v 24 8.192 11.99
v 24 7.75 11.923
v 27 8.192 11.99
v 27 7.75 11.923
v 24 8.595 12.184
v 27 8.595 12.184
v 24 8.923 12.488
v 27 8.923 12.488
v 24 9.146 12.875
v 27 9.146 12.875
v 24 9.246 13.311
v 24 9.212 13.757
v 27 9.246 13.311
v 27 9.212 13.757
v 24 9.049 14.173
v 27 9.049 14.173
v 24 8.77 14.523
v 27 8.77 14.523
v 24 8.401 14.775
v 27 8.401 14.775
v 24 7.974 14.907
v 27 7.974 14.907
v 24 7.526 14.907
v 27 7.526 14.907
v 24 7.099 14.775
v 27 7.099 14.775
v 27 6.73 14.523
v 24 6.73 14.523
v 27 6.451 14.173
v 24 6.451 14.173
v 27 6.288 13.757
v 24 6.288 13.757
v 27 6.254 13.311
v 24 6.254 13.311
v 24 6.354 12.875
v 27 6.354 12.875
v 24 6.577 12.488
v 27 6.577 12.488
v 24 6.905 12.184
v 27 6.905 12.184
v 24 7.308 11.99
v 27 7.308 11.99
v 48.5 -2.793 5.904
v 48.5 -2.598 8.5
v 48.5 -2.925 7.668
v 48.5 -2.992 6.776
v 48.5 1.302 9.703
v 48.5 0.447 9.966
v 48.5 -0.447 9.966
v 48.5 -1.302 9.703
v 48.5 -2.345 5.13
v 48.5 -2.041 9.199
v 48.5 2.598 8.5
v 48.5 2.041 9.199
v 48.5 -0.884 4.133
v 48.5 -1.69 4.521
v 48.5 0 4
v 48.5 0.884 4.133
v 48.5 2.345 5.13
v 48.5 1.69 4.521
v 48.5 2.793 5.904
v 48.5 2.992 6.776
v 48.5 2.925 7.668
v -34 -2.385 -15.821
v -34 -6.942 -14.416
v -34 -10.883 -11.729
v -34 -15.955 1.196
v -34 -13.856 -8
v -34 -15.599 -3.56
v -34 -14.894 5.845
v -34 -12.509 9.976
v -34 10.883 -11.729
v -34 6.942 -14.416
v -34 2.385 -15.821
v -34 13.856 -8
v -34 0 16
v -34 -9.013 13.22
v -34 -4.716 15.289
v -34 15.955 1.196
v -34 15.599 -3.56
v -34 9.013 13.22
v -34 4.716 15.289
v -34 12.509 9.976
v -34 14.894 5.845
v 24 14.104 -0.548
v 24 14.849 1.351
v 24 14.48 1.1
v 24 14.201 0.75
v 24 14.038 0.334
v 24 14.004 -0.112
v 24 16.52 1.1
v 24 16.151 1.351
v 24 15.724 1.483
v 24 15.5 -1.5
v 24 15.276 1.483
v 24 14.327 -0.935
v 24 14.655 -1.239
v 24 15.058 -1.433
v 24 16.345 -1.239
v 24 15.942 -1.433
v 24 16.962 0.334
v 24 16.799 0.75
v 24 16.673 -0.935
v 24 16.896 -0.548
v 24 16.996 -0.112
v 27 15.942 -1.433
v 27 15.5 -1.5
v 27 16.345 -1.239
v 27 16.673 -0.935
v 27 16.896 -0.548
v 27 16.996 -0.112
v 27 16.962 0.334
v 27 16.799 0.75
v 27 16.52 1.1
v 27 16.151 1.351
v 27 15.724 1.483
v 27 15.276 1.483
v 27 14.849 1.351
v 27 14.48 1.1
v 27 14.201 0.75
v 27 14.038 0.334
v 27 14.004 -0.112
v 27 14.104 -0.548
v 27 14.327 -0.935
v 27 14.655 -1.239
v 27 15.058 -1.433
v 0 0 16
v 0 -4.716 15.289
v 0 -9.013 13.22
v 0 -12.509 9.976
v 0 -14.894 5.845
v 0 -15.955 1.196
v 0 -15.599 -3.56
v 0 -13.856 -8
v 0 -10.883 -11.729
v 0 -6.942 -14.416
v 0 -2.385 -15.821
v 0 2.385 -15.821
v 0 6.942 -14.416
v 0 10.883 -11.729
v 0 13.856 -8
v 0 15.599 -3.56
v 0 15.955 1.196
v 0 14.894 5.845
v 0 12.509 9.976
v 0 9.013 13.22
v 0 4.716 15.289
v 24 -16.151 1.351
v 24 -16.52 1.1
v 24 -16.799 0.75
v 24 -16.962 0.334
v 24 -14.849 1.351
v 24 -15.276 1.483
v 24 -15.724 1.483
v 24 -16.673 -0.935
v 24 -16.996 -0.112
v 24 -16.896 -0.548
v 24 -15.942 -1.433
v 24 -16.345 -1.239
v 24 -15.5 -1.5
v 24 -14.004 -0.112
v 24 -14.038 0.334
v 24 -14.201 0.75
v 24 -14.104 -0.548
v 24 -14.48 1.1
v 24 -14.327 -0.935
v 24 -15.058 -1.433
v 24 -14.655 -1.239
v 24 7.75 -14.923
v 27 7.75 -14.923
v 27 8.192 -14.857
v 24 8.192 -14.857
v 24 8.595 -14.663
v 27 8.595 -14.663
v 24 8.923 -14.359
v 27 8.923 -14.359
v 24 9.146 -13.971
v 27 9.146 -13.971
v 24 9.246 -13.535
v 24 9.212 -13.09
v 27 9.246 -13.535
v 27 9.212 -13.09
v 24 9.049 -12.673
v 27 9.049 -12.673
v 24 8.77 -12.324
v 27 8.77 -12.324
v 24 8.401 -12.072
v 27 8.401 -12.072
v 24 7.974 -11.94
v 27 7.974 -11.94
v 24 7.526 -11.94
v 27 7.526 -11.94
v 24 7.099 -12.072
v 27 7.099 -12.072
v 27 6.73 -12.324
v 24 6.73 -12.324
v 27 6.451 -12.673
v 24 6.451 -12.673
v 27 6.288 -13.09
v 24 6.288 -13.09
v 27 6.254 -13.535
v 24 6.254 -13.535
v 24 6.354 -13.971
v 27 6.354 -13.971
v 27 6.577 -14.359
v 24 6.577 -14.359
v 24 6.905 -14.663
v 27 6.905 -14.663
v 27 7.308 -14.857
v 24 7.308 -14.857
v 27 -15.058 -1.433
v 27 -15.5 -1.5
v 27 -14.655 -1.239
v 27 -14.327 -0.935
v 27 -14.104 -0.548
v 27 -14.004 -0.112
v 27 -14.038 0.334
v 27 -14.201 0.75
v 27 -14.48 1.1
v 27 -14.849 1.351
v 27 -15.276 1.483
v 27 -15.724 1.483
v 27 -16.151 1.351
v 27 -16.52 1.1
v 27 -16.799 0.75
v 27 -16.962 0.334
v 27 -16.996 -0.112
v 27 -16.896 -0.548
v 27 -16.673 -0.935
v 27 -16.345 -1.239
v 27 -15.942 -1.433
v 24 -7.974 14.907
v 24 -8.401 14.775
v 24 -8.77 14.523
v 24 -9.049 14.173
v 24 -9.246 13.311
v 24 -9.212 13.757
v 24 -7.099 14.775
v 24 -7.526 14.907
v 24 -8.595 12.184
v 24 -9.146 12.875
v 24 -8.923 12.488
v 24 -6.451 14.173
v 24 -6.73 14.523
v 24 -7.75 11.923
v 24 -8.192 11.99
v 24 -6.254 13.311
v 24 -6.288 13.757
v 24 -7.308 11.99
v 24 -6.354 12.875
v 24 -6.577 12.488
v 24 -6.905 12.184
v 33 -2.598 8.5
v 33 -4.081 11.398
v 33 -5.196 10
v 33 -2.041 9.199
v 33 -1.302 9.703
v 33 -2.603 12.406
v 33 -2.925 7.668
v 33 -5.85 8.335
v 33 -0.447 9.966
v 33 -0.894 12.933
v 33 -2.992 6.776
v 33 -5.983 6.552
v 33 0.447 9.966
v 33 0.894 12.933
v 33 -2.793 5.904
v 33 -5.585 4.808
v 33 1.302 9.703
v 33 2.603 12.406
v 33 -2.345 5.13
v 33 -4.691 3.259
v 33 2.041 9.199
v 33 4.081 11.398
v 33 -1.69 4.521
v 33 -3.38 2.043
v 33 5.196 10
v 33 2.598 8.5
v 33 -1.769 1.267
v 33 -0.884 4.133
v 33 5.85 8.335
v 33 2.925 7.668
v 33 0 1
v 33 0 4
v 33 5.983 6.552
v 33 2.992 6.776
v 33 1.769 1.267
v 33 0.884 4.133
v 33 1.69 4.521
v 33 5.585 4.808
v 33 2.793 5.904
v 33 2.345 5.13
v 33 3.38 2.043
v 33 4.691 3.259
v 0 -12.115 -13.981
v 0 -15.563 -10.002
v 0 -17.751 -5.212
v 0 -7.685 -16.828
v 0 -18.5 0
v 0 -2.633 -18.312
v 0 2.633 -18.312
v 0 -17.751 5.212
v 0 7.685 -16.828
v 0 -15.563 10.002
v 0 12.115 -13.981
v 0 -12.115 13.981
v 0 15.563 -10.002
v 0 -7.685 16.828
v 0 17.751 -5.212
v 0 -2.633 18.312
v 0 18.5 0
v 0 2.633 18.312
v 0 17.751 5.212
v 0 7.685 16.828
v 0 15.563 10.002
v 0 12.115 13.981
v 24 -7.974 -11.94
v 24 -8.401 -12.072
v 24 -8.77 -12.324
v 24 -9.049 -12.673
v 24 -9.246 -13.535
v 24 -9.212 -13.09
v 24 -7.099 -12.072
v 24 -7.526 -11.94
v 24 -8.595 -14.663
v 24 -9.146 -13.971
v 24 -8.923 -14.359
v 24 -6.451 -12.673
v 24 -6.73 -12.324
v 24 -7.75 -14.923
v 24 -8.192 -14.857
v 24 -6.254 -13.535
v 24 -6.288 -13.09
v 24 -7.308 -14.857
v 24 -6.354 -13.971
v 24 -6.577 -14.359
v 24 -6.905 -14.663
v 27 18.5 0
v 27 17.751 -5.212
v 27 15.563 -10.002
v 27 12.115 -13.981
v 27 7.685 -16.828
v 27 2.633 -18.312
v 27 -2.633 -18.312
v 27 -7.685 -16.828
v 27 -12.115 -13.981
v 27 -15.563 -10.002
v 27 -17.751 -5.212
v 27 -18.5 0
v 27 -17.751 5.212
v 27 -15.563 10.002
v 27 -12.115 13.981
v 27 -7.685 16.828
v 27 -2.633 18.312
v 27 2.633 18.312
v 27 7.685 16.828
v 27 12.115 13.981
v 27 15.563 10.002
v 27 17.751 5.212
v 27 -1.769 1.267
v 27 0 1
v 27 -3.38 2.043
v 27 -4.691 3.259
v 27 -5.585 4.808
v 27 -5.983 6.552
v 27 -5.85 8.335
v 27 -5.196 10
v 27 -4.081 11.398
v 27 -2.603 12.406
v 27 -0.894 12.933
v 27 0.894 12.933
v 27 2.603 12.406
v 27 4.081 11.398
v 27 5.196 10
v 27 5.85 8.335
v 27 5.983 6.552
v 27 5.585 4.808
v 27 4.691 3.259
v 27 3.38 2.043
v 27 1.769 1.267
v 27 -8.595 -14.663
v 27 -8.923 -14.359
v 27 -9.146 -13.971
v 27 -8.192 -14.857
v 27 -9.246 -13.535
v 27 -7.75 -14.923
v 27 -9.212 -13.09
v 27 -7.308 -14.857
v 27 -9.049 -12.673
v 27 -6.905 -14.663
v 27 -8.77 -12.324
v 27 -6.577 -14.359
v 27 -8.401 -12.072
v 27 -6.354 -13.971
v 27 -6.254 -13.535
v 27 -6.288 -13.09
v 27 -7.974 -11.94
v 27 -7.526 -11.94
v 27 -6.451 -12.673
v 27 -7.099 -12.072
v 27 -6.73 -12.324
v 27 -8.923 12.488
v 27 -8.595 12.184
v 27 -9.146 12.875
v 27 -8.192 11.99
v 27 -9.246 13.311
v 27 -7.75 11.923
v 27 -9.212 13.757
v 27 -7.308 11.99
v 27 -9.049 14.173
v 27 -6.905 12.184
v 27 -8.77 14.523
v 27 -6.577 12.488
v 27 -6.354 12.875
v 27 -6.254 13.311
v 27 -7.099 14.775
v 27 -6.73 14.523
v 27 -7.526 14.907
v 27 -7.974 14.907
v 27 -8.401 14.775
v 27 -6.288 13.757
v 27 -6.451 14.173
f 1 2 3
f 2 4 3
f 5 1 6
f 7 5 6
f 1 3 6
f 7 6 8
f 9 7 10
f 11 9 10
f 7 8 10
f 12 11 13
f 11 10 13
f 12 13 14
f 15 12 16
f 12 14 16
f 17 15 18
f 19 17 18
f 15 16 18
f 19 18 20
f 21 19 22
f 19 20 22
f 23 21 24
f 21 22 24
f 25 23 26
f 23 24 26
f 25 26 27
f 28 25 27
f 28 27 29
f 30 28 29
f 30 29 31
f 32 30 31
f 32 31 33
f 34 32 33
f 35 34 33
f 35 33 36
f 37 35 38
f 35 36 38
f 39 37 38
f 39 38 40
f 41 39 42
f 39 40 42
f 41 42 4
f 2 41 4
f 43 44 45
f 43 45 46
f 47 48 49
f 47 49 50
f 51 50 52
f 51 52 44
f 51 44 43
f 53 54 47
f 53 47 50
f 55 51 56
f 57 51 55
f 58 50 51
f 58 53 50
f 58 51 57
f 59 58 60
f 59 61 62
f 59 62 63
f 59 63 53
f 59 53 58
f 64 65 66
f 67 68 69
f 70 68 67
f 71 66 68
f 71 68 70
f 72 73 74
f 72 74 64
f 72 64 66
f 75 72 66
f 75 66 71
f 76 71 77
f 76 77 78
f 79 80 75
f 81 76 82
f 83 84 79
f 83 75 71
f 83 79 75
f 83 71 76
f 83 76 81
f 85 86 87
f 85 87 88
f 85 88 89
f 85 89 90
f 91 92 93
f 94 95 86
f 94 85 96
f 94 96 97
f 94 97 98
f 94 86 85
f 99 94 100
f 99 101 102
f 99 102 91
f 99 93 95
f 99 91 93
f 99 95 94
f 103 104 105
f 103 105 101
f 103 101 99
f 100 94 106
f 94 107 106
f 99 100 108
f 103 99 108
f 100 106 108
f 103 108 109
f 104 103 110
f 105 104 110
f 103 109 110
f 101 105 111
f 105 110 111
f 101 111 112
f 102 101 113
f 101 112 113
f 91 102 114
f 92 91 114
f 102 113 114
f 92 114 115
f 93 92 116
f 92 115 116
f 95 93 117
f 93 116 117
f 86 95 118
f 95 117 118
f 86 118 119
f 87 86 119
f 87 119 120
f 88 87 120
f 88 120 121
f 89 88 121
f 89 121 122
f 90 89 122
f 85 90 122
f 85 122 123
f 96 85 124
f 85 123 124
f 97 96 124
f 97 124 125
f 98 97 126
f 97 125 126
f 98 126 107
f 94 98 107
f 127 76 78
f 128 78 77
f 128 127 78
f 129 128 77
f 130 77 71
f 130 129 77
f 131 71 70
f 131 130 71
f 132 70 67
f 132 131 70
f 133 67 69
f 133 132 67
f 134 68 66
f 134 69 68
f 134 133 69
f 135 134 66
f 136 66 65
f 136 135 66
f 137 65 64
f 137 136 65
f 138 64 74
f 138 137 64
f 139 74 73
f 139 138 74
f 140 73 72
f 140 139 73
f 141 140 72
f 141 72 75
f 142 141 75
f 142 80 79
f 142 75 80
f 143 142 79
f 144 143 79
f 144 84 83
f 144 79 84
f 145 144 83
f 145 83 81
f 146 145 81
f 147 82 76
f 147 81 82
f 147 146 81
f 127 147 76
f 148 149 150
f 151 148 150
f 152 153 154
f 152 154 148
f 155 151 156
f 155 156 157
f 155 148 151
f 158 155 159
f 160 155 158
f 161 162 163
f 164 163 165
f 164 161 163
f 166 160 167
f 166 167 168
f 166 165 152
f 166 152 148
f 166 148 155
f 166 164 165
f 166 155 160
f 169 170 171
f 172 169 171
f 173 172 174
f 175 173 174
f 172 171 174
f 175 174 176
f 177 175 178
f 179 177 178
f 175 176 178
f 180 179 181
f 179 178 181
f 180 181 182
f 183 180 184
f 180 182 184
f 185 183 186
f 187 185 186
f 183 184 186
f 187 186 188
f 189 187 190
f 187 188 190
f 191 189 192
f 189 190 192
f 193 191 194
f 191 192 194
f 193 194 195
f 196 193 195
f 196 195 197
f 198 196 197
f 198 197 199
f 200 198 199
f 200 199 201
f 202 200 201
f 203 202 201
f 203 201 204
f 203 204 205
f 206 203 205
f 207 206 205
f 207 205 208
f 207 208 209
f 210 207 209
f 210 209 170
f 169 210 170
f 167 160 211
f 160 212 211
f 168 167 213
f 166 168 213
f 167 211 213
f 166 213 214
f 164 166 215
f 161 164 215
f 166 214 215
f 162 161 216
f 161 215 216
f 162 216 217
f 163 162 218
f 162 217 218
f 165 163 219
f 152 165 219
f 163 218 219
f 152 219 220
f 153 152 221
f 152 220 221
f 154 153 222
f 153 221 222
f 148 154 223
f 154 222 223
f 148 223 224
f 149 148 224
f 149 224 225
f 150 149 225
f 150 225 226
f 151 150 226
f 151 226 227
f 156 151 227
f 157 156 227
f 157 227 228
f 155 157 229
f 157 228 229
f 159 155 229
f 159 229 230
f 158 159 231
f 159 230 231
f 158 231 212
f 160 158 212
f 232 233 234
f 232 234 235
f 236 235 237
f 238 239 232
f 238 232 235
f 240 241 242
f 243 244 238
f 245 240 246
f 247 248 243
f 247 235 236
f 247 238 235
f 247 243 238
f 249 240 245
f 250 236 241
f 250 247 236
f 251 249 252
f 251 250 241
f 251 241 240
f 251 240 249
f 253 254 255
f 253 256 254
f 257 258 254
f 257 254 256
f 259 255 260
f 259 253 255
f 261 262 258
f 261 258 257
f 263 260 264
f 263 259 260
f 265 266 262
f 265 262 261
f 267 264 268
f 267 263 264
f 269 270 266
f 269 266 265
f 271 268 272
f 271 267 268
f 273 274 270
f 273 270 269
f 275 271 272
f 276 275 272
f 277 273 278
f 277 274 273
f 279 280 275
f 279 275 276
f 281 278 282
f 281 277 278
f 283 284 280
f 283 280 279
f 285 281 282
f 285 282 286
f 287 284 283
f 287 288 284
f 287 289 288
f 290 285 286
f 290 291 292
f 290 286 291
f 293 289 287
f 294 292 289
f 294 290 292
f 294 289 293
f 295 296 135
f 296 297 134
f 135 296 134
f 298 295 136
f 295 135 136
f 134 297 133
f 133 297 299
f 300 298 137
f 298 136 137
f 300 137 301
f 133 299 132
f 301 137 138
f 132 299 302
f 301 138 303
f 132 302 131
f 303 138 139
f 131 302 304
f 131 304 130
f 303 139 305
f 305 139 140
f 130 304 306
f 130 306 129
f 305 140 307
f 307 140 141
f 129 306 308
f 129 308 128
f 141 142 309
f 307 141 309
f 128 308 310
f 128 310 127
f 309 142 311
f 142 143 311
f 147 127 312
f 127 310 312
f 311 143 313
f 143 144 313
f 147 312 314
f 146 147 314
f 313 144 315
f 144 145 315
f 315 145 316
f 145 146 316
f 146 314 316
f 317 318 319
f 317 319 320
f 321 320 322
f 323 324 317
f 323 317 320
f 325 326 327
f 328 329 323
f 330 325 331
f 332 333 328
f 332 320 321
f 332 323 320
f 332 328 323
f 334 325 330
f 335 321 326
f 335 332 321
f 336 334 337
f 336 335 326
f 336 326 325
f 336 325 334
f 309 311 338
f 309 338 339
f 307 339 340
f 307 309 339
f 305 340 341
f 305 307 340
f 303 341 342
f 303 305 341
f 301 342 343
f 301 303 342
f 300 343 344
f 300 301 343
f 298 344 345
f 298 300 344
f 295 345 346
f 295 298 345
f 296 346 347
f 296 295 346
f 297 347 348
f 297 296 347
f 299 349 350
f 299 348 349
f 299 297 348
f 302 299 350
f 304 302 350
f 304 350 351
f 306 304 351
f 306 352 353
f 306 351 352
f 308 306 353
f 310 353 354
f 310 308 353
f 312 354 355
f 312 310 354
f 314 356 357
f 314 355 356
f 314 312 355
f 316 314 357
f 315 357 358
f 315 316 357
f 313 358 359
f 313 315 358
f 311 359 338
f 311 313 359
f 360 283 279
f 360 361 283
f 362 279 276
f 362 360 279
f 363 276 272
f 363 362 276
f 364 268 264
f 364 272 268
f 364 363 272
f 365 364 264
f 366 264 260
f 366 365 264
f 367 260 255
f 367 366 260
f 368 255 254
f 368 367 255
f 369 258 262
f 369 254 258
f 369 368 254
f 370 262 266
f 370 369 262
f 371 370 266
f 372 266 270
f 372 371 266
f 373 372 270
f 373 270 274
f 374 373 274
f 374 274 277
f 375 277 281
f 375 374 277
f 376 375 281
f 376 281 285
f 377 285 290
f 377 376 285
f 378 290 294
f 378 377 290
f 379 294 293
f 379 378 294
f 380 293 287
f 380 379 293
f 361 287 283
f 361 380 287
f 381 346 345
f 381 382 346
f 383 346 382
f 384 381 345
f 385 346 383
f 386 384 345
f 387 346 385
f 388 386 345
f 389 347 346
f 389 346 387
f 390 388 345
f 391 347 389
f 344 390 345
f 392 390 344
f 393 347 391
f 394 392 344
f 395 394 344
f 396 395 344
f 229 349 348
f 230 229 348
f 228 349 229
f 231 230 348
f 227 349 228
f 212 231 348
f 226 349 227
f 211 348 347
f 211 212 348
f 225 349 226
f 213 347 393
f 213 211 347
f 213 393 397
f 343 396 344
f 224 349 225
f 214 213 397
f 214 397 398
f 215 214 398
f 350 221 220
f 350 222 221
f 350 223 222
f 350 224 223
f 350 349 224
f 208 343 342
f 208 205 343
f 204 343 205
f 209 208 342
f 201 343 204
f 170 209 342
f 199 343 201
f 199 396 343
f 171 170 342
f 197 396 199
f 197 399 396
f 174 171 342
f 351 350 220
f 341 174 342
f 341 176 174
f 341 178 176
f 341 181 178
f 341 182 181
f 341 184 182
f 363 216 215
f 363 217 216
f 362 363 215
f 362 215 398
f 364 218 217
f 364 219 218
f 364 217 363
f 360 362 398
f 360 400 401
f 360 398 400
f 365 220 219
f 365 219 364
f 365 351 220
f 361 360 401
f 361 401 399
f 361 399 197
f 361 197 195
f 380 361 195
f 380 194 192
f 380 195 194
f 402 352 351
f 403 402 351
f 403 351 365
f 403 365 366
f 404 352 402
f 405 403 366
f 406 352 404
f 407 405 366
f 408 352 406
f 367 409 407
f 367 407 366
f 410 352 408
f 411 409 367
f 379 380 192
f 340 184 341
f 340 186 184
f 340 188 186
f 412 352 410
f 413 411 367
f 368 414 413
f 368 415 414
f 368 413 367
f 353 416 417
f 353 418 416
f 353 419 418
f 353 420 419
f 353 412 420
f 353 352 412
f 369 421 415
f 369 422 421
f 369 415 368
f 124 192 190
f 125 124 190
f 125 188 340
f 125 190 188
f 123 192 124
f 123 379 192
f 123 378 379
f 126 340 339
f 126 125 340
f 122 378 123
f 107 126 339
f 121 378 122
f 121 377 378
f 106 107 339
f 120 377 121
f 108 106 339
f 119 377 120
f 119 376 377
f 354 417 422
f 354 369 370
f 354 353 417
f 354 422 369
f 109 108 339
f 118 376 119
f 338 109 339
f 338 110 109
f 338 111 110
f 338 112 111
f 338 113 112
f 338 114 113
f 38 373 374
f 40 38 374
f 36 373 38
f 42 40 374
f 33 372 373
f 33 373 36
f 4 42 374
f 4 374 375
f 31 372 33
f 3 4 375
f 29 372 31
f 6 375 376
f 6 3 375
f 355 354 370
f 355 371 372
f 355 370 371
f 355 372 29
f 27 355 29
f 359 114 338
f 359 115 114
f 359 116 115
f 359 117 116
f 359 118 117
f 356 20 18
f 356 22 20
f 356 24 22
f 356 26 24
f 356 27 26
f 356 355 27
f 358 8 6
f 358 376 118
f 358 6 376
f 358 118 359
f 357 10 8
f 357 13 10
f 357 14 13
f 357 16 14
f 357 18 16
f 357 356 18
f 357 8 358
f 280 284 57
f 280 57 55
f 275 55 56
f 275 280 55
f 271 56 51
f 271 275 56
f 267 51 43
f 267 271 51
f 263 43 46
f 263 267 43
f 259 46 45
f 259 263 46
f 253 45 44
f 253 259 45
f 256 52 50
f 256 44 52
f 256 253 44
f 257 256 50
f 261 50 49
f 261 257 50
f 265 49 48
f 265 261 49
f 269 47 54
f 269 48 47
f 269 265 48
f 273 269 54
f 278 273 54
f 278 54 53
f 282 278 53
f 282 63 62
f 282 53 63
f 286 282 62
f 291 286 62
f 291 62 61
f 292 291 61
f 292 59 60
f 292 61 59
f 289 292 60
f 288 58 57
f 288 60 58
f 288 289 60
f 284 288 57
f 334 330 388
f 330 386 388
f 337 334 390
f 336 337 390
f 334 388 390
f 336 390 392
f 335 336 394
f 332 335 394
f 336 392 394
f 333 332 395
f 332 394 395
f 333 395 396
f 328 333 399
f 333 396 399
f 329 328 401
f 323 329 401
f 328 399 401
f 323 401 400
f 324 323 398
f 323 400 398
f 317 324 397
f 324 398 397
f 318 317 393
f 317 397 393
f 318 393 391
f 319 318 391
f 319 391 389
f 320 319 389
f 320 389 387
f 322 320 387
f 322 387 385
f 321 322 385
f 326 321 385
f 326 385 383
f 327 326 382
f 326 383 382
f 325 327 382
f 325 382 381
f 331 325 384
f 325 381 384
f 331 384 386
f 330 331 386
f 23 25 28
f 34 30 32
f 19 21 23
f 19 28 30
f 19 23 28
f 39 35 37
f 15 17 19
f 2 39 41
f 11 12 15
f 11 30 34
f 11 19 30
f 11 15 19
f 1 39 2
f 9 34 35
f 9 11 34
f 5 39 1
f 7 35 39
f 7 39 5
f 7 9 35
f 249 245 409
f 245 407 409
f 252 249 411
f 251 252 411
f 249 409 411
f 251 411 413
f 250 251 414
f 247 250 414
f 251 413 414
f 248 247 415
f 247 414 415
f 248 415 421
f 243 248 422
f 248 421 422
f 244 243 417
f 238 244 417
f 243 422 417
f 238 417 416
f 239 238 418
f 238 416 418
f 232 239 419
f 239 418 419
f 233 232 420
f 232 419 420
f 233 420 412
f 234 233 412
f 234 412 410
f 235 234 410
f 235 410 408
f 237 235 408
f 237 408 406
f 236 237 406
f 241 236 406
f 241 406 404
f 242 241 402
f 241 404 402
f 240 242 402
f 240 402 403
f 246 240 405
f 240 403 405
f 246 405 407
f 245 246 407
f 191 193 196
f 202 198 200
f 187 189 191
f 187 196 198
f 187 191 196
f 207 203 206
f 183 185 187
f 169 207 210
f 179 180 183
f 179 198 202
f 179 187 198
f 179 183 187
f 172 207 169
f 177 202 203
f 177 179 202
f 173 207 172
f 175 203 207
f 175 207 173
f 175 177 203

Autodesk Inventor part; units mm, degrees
ref_plane "YZ Plane" through (0, 0, 0) normal (1, 0, 0) x (0, 1, 0)
ref_plane "XZ Plane" through (0, 0, 0) normal (0, 1, 0) x (-1, 0, 0)
ref_plane "XY Plane" through (0, 0, 0) normal (0, 0, 1) x (1, 0, 0)
sketch "Sketch1" plane through (0, 0, 0) normal (1, 0, 0) x (0, 1, 0)
  circle A0 centre (0, 0) radius 18.5
  dimension "d0" = 37
extrude "Extrusion1" add sketch "Sketch1" along normal blind 27
sketch "Sketch2" plane through (0, 0, 0) normal (-1, 0, 0) x (0, 0, 1)
  circle A0 centre (0, 0) radius 16
  dimension "d3" = 32
extrude "Extrusion2" add sketch "Sketch2" along normal blind 34
sketch "Sketch3" plane through (27, 0, 0) normal (1, 0, 0) x (0, 0, -1)
  circle A0 centre (0, 15.5) radius 1.5
  circle A1 centre (-13.4234, 7.75) radius 1.5
  circle A2 centre (-13.4234, -7.75) radius 1.5
  circle A3 centre (0, -15.5) radius 1.5
  circle A4 centre (13.4234, -7.75) radius 1.5
  circle A5 centre (13.4234, 7.75) radius 1.5
  point P0 (0, 0)
  dimension "d8" = 3
  dimension "d9" = 15.5
  dimension "d12" = 360
extrude "Extrusion3" cut sketch "Sketch3" against normal blind 3
sketch "Sketch4" plane through (27, 0, 0) normal (1, 0, 0) x (0, 0, -1)
  circle A0 centre (-7, 0) radius 6
  point P0 (0, 0)
  dimension "d16" = 12
  dimension "d17" = 7
extrude "Extrusion4" add sketch "Sketch4" along normal blind 6
sketch "Sketch5" plane through (33, 0, 7) normal (1, 0, 0) x (0, 0, -1)
  circle A0 centre (0, 0) radius 3
  point P0 (7, 0)
  dimension "d20" = 6
  dimension "d21" = 7
extrude "Extrusion5" add sketch "Sketch5" along normal blind 15.5
properties part number "SPG30_Motor"
